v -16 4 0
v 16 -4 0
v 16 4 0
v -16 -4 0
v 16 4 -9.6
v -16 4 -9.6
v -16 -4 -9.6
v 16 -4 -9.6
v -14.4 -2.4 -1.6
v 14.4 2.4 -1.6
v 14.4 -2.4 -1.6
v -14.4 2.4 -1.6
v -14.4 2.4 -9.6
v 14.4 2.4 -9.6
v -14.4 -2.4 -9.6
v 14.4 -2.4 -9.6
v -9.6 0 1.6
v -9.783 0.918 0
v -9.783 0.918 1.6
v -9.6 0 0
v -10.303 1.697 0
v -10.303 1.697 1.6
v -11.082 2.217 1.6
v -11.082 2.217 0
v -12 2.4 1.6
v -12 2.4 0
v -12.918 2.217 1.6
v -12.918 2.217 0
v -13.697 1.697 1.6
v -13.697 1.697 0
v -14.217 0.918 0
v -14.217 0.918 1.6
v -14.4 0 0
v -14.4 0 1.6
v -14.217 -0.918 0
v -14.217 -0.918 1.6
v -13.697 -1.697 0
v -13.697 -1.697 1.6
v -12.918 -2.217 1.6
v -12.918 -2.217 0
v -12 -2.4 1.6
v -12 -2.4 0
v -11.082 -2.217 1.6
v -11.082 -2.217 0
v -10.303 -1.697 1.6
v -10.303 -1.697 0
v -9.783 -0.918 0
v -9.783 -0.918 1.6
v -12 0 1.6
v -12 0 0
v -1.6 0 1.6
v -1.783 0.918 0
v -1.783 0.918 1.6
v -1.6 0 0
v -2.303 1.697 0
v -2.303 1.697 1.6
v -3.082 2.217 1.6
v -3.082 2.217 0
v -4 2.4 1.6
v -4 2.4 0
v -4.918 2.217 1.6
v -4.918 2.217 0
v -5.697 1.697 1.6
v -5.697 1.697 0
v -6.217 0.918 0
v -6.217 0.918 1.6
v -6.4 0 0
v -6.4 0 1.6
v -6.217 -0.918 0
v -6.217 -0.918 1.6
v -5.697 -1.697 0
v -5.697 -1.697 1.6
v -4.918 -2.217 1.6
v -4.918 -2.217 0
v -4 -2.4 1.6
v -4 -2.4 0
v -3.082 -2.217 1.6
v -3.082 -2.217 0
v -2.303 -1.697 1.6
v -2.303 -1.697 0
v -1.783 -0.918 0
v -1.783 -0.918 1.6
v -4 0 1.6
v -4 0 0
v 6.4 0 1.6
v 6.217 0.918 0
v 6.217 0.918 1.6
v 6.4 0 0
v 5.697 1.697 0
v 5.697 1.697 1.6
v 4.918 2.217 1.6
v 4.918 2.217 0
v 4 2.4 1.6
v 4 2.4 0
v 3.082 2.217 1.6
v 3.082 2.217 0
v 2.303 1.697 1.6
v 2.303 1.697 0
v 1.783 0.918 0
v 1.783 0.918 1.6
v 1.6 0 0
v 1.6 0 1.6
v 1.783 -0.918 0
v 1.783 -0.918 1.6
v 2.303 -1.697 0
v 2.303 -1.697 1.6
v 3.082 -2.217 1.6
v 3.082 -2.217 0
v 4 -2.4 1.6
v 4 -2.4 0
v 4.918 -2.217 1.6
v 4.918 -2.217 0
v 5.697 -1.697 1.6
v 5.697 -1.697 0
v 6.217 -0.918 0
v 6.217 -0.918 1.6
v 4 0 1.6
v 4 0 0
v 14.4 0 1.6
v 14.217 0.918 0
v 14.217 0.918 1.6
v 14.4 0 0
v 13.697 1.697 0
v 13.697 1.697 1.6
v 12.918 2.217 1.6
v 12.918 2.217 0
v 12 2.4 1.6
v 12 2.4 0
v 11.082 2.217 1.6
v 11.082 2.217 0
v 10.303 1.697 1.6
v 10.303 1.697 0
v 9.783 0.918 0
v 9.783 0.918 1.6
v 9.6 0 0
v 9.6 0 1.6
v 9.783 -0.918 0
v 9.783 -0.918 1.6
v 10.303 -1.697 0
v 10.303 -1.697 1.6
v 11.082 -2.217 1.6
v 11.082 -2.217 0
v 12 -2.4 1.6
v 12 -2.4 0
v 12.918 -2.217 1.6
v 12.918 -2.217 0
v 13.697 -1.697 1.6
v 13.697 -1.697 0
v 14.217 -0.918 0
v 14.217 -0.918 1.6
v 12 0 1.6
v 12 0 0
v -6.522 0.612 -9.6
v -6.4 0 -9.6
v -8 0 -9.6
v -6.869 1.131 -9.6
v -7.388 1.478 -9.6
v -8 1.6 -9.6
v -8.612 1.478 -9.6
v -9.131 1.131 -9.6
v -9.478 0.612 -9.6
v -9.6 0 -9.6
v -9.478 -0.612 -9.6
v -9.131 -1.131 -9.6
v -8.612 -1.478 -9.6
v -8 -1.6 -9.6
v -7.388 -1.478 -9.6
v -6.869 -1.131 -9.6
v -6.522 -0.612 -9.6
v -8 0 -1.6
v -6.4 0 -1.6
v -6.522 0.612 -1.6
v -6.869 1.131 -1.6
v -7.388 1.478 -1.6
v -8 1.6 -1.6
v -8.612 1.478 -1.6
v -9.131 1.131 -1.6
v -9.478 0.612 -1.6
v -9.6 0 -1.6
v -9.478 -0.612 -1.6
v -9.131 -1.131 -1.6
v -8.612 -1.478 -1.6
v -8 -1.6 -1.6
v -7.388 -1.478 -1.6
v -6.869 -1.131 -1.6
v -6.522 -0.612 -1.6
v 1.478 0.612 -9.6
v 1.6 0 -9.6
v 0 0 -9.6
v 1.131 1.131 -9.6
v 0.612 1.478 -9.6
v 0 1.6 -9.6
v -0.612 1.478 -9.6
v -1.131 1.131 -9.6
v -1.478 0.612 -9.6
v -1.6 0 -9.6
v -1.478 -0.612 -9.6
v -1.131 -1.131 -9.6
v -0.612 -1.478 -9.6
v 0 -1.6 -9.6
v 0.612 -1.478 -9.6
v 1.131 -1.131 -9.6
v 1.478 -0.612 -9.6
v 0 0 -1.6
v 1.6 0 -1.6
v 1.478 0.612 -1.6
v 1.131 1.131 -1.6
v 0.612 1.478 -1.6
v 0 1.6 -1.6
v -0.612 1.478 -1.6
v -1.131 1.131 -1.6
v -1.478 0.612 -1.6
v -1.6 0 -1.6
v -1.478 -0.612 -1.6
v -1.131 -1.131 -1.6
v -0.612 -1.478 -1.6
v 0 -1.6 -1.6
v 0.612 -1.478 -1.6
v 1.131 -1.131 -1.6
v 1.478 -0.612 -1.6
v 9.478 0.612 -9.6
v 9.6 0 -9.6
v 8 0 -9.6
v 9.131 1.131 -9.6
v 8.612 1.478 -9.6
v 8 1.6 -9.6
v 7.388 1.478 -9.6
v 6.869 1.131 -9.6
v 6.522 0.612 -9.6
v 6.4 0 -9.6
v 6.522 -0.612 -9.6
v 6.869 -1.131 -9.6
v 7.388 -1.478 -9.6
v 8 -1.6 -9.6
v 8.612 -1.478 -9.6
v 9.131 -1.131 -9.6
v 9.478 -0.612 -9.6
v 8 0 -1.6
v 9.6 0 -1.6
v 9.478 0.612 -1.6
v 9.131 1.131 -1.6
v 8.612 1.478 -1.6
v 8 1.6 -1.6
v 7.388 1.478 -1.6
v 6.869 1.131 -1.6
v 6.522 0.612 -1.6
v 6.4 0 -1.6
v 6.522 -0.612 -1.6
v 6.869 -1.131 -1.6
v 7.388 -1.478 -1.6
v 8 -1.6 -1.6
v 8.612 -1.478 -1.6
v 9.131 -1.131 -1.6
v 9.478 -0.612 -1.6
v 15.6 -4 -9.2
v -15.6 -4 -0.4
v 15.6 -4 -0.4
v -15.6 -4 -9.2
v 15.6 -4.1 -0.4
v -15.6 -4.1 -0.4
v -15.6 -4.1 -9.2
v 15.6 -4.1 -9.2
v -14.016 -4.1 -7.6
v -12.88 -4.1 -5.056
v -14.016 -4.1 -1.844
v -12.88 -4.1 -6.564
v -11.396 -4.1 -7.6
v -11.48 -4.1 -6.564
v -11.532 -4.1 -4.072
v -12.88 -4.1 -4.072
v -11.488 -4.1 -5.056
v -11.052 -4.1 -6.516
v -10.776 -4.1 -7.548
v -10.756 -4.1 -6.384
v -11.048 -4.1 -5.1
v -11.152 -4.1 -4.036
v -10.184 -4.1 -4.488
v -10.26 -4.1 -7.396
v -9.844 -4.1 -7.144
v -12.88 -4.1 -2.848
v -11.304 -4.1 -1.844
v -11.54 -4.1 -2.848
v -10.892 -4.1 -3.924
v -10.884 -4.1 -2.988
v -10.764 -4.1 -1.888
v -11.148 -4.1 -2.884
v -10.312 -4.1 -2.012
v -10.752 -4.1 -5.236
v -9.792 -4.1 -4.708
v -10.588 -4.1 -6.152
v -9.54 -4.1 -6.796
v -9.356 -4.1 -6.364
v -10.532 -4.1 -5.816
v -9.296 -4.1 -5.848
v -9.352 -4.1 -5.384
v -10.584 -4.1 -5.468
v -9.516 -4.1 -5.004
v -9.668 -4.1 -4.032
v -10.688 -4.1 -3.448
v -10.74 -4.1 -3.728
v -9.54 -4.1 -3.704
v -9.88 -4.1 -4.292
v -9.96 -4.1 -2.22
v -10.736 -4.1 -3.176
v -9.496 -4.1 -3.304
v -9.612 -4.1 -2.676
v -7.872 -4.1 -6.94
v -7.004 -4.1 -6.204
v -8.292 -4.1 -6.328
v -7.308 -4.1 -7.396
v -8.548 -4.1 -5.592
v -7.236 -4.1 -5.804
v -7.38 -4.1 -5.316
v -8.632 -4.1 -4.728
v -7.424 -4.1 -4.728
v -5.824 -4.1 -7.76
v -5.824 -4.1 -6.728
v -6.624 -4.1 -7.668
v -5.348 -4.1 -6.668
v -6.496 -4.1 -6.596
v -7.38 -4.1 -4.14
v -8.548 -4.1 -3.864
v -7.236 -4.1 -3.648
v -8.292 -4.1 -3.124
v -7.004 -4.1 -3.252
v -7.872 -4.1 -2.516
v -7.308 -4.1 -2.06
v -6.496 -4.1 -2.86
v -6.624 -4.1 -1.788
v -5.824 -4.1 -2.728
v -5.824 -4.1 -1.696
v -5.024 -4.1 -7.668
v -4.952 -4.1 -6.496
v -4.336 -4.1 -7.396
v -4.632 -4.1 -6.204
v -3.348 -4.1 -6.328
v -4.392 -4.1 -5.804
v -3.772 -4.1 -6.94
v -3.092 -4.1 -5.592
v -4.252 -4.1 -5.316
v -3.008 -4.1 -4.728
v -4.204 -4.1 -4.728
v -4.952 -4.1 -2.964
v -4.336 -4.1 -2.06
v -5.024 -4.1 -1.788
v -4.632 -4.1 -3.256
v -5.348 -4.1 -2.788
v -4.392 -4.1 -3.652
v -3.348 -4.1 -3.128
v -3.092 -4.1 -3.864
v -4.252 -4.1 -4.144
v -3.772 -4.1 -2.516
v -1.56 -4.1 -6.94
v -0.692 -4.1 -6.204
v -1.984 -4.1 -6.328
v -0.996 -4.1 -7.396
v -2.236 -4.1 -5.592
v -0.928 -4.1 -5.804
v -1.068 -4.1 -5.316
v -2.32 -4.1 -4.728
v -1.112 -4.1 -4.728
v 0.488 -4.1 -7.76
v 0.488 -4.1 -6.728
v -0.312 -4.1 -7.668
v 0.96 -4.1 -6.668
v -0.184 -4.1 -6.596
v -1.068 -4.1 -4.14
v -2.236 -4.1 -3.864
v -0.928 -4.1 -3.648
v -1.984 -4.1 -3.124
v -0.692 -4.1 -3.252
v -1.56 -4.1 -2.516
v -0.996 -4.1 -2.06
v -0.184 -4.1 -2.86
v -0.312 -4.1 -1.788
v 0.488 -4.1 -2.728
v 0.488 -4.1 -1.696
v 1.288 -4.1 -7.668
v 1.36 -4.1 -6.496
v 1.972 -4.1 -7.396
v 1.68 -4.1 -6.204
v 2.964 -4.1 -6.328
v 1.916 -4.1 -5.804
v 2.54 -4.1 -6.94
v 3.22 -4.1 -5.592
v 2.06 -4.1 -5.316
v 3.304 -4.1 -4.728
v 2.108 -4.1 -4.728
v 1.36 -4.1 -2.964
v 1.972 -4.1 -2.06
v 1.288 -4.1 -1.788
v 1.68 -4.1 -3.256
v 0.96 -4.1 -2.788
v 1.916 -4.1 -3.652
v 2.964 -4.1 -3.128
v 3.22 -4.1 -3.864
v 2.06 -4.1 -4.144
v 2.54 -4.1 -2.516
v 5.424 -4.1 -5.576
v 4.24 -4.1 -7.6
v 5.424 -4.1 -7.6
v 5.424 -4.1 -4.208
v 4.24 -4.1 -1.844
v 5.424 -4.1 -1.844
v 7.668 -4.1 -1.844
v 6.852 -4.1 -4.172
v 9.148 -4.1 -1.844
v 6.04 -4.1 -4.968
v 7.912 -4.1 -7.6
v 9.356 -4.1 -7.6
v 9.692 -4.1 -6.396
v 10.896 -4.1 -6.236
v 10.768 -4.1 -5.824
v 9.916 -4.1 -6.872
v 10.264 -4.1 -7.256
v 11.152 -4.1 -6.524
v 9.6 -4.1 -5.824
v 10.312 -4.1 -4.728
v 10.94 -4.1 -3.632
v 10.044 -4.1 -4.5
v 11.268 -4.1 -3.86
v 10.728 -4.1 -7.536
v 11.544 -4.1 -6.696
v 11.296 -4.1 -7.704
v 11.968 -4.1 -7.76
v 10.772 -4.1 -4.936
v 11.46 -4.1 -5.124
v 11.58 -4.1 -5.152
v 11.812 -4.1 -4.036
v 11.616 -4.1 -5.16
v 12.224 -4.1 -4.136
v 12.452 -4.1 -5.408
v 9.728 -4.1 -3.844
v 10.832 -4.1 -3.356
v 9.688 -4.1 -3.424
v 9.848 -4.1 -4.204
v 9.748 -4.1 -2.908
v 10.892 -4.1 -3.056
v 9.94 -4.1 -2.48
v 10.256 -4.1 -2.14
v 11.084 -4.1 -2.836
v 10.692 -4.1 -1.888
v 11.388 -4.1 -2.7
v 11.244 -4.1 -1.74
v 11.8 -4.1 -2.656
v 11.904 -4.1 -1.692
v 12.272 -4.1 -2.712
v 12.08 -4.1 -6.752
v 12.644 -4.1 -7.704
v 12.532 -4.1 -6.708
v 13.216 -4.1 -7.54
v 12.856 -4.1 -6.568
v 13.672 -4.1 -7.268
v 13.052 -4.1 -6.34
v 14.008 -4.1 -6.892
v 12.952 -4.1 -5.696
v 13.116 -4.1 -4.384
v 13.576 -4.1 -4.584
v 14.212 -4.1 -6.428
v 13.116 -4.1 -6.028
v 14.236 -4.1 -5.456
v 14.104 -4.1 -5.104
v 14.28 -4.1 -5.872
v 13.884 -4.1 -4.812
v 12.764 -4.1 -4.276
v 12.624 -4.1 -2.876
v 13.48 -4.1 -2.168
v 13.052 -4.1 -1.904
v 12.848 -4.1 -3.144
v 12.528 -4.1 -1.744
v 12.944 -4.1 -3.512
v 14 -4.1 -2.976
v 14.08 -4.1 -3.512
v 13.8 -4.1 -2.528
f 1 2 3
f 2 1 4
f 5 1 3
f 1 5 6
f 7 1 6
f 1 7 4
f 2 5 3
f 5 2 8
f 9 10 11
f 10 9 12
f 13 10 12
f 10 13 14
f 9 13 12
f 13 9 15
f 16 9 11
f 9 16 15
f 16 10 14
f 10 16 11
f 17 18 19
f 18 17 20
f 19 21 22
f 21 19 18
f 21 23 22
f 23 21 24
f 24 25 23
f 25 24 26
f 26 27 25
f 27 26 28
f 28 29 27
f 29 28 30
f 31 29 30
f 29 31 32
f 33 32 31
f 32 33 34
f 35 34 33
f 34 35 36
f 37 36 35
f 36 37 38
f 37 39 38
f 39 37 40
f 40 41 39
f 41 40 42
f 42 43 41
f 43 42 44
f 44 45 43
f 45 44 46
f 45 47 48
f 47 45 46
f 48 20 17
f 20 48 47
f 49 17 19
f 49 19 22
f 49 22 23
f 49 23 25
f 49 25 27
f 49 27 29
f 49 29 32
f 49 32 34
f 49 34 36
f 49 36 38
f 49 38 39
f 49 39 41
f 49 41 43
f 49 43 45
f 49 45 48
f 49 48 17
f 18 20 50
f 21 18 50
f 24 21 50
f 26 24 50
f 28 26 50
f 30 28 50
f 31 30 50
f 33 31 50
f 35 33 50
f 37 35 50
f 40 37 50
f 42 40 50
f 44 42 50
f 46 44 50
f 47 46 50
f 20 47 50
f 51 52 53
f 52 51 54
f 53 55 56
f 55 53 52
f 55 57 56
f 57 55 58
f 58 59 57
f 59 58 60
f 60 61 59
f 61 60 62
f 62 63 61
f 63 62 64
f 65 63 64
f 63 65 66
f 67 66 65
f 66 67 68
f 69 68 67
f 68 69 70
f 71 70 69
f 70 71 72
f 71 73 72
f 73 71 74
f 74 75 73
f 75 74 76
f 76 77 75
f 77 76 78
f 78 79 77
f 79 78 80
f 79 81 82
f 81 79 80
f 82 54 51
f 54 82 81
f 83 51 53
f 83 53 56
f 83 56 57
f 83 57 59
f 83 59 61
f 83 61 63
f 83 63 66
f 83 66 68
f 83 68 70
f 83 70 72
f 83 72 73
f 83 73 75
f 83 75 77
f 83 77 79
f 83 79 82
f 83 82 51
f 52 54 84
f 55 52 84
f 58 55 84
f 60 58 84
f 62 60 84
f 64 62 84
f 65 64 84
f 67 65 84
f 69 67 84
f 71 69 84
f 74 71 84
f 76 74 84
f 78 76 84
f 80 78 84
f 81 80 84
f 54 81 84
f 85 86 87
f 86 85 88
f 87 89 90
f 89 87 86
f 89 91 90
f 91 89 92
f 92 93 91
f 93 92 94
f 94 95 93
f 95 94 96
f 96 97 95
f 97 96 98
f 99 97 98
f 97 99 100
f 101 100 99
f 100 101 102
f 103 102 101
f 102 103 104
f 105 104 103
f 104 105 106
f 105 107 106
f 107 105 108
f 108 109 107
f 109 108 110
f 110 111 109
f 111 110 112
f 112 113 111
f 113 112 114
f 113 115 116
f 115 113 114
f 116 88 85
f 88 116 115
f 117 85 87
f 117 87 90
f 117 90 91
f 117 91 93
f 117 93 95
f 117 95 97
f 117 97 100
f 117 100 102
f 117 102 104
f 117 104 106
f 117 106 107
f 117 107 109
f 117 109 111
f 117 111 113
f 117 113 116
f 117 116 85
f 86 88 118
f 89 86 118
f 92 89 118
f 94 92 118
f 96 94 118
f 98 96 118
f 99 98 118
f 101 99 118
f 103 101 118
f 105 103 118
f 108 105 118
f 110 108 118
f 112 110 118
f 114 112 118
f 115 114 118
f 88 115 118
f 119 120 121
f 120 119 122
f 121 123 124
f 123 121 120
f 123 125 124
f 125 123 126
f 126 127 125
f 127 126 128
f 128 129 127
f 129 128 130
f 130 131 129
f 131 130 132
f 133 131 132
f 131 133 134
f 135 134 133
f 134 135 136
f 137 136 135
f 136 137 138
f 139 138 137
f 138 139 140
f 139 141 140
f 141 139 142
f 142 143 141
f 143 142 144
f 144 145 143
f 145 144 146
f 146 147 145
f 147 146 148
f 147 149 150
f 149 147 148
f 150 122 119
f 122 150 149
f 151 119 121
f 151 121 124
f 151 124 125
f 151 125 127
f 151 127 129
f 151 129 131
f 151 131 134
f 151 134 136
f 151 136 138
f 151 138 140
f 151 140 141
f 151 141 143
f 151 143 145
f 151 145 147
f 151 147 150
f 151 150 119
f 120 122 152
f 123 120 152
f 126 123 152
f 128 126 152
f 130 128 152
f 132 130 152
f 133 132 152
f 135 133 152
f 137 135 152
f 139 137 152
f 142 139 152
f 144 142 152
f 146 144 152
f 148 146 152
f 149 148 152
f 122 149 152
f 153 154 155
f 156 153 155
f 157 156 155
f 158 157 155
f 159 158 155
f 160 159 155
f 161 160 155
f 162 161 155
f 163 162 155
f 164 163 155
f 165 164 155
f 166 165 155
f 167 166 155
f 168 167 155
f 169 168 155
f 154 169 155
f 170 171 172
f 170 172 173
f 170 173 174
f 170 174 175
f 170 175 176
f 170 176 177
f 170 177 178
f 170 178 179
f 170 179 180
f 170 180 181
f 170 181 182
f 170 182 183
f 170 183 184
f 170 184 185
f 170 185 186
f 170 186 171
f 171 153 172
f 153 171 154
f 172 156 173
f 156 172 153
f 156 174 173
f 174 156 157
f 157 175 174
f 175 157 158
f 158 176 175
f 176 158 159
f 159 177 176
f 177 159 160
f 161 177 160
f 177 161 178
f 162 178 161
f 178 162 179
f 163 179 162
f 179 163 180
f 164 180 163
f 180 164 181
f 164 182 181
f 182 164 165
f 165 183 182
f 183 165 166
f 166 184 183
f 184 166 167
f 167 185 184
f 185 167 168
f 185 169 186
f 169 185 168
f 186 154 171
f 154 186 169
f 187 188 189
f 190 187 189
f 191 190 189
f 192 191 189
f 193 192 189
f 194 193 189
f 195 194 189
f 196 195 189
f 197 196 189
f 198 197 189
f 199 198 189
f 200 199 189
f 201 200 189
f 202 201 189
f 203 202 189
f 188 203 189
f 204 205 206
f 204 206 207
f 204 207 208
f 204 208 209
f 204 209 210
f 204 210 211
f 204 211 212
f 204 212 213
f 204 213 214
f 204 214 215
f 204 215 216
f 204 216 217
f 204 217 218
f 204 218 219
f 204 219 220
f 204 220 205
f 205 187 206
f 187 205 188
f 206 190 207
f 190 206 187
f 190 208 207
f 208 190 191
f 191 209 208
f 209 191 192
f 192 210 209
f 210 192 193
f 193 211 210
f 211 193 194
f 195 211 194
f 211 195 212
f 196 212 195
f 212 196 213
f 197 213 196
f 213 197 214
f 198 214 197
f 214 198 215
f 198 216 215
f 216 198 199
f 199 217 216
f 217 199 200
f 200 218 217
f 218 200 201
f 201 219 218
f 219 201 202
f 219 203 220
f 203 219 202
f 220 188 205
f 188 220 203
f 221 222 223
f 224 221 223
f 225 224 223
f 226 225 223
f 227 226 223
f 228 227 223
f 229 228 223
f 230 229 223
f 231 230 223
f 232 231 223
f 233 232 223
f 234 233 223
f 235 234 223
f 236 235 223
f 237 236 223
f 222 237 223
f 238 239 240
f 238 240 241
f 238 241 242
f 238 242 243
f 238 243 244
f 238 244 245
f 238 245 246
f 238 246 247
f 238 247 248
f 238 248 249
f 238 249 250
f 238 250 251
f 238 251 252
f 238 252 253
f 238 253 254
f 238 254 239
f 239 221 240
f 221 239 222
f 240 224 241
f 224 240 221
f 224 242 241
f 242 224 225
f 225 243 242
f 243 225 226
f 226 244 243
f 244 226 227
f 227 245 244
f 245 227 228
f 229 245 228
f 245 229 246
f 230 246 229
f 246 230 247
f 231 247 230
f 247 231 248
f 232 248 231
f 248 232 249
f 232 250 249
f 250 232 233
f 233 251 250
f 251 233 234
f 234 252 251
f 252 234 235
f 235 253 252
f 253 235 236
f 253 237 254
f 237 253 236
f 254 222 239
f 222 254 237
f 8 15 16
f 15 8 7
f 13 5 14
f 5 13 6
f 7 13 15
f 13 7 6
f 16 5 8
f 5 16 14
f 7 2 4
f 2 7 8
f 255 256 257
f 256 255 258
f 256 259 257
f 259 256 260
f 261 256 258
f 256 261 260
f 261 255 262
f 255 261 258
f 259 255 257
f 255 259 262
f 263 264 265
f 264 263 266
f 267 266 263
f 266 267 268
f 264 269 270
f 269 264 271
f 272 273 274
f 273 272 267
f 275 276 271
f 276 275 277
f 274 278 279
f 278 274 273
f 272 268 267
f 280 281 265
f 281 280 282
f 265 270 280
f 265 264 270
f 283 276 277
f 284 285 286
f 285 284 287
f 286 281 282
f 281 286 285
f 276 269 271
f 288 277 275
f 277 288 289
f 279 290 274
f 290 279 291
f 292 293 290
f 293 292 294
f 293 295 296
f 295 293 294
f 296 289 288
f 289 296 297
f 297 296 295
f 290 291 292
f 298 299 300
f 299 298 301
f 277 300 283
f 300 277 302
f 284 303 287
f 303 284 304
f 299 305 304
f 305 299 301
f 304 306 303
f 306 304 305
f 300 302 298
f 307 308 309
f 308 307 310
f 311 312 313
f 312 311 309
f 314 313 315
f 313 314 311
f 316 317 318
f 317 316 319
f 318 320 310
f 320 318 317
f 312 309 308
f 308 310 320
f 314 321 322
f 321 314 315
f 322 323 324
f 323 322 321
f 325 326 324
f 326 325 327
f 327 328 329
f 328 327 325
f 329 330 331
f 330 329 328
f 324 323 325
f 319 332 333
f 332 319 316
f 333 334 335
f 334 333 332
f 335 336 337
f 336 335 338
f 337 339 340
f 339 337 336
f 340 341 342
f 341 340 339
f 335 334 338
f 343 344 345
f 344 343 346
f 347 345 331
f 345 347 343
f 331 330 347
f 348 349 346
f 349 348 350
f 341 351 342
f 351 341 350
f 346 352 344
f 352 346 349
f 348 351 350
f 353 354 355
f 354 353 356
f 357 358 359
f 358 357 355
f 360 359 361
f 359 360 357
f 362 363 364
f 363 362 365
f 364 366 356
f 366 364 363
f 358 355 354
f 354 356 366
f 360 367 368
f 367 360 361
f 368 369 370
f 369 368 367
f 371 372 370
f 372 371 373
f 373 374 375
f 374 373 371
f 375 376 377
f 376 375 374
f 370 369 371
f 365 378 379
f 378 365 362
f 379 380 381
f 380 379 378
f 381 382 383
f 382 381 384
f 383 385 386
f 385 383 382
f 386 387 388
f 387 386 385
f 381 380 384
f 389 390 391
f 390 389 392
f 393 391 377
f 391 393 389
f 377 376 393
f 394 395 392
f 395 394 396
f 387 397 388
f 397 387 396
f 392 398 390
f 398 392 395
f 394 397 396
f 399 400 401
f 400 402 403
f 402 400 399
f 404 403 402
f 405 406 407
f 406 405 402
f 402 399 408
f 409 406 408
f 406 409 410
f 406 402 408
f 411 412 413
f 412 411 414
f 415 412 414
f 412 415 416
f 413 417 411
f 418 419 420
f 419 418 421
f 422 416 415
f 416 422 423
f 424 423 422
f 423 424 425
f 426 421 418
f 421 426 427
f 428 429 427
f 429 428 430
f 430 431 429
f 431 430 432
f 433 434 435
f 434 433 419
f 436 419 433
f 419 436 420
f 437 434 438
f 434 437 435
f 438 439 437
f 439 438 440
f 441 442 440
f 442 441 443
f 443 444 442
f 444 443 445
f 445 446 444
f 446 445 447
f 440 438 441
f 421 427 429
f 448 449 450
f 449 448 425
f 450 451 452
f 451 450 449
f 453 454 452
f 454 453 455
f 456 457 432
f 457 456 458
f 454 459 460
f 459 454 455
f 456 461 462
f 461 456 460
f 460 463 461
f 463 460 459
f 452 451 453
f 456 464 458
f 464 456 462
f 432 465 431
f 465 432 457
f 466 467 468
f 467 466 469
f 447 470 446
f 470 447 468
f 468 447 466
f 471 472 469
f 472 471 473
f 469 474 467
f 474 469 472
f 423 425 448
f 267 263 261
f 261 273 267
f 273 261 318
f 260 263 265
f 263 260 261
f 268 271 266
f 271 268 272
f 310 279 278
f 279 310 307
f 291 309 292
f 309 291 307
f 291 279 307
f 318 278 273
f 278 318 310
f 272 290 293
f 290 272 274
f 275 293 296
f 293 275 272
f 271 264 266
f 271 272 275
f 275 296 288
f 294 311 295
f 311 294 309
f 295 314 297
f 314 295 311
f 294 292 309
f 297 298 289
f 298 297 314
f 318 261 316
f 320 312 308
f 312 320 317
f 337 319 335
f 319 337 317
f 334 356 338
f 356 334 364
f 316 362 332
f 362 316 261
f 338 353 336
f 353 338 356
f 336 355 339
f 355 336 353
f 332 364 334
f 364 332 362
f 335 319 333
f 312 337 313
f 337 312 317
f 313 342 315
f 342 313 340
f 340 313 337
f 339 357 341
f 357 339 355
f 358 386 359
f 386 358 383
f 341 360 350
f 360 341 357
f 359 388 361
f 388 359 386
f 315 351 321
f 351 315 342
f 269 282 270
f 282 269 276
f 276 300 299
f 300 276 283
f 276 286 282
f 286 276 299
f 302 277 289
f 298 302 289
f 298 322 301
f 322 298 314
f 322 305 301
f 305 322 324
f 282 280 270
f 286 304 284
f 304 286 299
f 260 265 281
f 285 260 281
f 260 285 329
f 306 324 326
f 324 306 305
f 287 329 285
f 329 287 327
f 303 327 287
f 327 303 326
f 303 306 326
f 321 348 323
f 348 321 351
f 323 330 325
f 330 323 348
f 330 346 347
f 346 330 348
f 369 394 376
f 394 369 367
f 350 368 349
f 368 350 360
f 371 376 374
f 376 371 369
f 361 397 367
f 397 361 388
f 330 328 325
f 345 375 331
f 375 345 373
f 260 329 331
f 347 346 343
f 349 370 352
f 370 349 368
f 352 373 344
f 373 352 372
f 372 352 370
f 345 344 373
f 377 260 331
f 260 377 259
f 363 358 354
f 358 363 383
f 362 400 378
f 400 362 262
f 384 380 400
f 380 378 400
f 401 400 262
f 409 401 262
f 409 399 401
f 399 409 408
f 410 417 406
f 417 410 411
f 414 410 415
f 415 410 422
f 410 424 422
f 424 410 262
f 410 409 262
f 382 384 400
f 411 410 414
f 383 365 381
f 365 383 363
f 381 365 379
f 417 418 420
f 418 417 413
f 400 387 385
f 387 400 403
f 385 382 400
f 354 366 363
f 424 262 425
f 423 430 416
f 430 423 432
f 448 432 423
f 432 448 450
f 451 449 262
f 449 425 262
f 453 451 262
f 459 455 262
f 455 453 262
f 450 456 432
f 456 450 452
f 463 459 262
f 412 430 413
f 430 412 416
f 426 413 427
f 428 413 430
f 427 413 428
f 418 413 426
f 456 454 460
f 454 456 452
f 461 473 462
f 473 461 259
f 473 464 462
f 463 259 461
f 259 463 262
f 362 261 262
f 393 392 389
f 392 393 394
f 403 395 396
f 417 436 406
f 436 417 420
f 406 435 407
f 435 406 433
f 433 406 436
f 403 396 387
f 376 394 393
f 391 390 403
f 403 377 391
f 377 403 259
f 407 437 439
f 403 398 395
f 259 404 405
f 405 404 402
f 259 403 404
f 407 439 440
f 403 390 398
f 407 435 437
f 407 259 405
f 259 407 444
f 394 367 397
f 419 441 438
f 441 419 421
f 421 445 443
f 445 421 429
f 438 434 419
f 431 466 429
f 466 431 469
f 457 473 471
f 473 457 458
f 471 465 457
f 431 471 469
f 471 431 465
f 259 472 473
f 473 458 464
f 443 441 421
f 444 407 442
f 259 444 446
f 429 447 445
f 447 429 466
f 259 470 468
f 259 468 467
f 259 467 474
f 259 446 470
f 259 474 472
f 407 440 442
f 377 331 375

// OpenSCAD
use <../lib.scad>
use <190765h.scad>
use <3010.scad>
function ldraw_lib__3010d0a() = [
// 0 Brick  1 x  4 with "BOOKS" Sticker
// 0 Name: 3010d0a.dat
// 0 Author: Takeshi Takahashi [RainbowDolphin]
// 0 !LDRAW_ORG Shortcut UPDATE 2024-06
// 0 !LICENSE Licensed under CC BY 4.0 : see CAreadme.txt
// 
// 0 BFC CERTIFY CCW
  [0,"BFC","CERTIFY"],
  [0,"BFC","CCW"],
// 
// 0 !CATEGORY Sticker Shortcut
// 0 !KEYWORDS Bricklink 3010pb061, set 1592, Town Square
// 
// 0 !HISTORY 2024-07-29 [OrionP] Official Update 2024-06
// 
// 1 16 0 0 0 1 0 0 0 1 0 0 0 1 3010.dat
  [1,16,0,0,0,1,0,0,0,1,0,0,0,1, ldraw_lib__3010()],
// 1 16 0 12 -10 1 0 0 0 0 -1 0 1 0 190765h.dat
  [1,16,0,12,-10,1,0,0,0,0,-1,0,1,0, ldraw_lib__190765h()],
];
module ldraw_lib__3010d0a(step=0, col=false, unit=2/5, alt=false, line=0.2, solid=!$preview)
    makepoly(ldraw_lib__3010d0a(), step=step, col=col, unit=unit, alt=alt, line=line, solid=solid);
ldraw_lib__3010d0a(line=0.2);
